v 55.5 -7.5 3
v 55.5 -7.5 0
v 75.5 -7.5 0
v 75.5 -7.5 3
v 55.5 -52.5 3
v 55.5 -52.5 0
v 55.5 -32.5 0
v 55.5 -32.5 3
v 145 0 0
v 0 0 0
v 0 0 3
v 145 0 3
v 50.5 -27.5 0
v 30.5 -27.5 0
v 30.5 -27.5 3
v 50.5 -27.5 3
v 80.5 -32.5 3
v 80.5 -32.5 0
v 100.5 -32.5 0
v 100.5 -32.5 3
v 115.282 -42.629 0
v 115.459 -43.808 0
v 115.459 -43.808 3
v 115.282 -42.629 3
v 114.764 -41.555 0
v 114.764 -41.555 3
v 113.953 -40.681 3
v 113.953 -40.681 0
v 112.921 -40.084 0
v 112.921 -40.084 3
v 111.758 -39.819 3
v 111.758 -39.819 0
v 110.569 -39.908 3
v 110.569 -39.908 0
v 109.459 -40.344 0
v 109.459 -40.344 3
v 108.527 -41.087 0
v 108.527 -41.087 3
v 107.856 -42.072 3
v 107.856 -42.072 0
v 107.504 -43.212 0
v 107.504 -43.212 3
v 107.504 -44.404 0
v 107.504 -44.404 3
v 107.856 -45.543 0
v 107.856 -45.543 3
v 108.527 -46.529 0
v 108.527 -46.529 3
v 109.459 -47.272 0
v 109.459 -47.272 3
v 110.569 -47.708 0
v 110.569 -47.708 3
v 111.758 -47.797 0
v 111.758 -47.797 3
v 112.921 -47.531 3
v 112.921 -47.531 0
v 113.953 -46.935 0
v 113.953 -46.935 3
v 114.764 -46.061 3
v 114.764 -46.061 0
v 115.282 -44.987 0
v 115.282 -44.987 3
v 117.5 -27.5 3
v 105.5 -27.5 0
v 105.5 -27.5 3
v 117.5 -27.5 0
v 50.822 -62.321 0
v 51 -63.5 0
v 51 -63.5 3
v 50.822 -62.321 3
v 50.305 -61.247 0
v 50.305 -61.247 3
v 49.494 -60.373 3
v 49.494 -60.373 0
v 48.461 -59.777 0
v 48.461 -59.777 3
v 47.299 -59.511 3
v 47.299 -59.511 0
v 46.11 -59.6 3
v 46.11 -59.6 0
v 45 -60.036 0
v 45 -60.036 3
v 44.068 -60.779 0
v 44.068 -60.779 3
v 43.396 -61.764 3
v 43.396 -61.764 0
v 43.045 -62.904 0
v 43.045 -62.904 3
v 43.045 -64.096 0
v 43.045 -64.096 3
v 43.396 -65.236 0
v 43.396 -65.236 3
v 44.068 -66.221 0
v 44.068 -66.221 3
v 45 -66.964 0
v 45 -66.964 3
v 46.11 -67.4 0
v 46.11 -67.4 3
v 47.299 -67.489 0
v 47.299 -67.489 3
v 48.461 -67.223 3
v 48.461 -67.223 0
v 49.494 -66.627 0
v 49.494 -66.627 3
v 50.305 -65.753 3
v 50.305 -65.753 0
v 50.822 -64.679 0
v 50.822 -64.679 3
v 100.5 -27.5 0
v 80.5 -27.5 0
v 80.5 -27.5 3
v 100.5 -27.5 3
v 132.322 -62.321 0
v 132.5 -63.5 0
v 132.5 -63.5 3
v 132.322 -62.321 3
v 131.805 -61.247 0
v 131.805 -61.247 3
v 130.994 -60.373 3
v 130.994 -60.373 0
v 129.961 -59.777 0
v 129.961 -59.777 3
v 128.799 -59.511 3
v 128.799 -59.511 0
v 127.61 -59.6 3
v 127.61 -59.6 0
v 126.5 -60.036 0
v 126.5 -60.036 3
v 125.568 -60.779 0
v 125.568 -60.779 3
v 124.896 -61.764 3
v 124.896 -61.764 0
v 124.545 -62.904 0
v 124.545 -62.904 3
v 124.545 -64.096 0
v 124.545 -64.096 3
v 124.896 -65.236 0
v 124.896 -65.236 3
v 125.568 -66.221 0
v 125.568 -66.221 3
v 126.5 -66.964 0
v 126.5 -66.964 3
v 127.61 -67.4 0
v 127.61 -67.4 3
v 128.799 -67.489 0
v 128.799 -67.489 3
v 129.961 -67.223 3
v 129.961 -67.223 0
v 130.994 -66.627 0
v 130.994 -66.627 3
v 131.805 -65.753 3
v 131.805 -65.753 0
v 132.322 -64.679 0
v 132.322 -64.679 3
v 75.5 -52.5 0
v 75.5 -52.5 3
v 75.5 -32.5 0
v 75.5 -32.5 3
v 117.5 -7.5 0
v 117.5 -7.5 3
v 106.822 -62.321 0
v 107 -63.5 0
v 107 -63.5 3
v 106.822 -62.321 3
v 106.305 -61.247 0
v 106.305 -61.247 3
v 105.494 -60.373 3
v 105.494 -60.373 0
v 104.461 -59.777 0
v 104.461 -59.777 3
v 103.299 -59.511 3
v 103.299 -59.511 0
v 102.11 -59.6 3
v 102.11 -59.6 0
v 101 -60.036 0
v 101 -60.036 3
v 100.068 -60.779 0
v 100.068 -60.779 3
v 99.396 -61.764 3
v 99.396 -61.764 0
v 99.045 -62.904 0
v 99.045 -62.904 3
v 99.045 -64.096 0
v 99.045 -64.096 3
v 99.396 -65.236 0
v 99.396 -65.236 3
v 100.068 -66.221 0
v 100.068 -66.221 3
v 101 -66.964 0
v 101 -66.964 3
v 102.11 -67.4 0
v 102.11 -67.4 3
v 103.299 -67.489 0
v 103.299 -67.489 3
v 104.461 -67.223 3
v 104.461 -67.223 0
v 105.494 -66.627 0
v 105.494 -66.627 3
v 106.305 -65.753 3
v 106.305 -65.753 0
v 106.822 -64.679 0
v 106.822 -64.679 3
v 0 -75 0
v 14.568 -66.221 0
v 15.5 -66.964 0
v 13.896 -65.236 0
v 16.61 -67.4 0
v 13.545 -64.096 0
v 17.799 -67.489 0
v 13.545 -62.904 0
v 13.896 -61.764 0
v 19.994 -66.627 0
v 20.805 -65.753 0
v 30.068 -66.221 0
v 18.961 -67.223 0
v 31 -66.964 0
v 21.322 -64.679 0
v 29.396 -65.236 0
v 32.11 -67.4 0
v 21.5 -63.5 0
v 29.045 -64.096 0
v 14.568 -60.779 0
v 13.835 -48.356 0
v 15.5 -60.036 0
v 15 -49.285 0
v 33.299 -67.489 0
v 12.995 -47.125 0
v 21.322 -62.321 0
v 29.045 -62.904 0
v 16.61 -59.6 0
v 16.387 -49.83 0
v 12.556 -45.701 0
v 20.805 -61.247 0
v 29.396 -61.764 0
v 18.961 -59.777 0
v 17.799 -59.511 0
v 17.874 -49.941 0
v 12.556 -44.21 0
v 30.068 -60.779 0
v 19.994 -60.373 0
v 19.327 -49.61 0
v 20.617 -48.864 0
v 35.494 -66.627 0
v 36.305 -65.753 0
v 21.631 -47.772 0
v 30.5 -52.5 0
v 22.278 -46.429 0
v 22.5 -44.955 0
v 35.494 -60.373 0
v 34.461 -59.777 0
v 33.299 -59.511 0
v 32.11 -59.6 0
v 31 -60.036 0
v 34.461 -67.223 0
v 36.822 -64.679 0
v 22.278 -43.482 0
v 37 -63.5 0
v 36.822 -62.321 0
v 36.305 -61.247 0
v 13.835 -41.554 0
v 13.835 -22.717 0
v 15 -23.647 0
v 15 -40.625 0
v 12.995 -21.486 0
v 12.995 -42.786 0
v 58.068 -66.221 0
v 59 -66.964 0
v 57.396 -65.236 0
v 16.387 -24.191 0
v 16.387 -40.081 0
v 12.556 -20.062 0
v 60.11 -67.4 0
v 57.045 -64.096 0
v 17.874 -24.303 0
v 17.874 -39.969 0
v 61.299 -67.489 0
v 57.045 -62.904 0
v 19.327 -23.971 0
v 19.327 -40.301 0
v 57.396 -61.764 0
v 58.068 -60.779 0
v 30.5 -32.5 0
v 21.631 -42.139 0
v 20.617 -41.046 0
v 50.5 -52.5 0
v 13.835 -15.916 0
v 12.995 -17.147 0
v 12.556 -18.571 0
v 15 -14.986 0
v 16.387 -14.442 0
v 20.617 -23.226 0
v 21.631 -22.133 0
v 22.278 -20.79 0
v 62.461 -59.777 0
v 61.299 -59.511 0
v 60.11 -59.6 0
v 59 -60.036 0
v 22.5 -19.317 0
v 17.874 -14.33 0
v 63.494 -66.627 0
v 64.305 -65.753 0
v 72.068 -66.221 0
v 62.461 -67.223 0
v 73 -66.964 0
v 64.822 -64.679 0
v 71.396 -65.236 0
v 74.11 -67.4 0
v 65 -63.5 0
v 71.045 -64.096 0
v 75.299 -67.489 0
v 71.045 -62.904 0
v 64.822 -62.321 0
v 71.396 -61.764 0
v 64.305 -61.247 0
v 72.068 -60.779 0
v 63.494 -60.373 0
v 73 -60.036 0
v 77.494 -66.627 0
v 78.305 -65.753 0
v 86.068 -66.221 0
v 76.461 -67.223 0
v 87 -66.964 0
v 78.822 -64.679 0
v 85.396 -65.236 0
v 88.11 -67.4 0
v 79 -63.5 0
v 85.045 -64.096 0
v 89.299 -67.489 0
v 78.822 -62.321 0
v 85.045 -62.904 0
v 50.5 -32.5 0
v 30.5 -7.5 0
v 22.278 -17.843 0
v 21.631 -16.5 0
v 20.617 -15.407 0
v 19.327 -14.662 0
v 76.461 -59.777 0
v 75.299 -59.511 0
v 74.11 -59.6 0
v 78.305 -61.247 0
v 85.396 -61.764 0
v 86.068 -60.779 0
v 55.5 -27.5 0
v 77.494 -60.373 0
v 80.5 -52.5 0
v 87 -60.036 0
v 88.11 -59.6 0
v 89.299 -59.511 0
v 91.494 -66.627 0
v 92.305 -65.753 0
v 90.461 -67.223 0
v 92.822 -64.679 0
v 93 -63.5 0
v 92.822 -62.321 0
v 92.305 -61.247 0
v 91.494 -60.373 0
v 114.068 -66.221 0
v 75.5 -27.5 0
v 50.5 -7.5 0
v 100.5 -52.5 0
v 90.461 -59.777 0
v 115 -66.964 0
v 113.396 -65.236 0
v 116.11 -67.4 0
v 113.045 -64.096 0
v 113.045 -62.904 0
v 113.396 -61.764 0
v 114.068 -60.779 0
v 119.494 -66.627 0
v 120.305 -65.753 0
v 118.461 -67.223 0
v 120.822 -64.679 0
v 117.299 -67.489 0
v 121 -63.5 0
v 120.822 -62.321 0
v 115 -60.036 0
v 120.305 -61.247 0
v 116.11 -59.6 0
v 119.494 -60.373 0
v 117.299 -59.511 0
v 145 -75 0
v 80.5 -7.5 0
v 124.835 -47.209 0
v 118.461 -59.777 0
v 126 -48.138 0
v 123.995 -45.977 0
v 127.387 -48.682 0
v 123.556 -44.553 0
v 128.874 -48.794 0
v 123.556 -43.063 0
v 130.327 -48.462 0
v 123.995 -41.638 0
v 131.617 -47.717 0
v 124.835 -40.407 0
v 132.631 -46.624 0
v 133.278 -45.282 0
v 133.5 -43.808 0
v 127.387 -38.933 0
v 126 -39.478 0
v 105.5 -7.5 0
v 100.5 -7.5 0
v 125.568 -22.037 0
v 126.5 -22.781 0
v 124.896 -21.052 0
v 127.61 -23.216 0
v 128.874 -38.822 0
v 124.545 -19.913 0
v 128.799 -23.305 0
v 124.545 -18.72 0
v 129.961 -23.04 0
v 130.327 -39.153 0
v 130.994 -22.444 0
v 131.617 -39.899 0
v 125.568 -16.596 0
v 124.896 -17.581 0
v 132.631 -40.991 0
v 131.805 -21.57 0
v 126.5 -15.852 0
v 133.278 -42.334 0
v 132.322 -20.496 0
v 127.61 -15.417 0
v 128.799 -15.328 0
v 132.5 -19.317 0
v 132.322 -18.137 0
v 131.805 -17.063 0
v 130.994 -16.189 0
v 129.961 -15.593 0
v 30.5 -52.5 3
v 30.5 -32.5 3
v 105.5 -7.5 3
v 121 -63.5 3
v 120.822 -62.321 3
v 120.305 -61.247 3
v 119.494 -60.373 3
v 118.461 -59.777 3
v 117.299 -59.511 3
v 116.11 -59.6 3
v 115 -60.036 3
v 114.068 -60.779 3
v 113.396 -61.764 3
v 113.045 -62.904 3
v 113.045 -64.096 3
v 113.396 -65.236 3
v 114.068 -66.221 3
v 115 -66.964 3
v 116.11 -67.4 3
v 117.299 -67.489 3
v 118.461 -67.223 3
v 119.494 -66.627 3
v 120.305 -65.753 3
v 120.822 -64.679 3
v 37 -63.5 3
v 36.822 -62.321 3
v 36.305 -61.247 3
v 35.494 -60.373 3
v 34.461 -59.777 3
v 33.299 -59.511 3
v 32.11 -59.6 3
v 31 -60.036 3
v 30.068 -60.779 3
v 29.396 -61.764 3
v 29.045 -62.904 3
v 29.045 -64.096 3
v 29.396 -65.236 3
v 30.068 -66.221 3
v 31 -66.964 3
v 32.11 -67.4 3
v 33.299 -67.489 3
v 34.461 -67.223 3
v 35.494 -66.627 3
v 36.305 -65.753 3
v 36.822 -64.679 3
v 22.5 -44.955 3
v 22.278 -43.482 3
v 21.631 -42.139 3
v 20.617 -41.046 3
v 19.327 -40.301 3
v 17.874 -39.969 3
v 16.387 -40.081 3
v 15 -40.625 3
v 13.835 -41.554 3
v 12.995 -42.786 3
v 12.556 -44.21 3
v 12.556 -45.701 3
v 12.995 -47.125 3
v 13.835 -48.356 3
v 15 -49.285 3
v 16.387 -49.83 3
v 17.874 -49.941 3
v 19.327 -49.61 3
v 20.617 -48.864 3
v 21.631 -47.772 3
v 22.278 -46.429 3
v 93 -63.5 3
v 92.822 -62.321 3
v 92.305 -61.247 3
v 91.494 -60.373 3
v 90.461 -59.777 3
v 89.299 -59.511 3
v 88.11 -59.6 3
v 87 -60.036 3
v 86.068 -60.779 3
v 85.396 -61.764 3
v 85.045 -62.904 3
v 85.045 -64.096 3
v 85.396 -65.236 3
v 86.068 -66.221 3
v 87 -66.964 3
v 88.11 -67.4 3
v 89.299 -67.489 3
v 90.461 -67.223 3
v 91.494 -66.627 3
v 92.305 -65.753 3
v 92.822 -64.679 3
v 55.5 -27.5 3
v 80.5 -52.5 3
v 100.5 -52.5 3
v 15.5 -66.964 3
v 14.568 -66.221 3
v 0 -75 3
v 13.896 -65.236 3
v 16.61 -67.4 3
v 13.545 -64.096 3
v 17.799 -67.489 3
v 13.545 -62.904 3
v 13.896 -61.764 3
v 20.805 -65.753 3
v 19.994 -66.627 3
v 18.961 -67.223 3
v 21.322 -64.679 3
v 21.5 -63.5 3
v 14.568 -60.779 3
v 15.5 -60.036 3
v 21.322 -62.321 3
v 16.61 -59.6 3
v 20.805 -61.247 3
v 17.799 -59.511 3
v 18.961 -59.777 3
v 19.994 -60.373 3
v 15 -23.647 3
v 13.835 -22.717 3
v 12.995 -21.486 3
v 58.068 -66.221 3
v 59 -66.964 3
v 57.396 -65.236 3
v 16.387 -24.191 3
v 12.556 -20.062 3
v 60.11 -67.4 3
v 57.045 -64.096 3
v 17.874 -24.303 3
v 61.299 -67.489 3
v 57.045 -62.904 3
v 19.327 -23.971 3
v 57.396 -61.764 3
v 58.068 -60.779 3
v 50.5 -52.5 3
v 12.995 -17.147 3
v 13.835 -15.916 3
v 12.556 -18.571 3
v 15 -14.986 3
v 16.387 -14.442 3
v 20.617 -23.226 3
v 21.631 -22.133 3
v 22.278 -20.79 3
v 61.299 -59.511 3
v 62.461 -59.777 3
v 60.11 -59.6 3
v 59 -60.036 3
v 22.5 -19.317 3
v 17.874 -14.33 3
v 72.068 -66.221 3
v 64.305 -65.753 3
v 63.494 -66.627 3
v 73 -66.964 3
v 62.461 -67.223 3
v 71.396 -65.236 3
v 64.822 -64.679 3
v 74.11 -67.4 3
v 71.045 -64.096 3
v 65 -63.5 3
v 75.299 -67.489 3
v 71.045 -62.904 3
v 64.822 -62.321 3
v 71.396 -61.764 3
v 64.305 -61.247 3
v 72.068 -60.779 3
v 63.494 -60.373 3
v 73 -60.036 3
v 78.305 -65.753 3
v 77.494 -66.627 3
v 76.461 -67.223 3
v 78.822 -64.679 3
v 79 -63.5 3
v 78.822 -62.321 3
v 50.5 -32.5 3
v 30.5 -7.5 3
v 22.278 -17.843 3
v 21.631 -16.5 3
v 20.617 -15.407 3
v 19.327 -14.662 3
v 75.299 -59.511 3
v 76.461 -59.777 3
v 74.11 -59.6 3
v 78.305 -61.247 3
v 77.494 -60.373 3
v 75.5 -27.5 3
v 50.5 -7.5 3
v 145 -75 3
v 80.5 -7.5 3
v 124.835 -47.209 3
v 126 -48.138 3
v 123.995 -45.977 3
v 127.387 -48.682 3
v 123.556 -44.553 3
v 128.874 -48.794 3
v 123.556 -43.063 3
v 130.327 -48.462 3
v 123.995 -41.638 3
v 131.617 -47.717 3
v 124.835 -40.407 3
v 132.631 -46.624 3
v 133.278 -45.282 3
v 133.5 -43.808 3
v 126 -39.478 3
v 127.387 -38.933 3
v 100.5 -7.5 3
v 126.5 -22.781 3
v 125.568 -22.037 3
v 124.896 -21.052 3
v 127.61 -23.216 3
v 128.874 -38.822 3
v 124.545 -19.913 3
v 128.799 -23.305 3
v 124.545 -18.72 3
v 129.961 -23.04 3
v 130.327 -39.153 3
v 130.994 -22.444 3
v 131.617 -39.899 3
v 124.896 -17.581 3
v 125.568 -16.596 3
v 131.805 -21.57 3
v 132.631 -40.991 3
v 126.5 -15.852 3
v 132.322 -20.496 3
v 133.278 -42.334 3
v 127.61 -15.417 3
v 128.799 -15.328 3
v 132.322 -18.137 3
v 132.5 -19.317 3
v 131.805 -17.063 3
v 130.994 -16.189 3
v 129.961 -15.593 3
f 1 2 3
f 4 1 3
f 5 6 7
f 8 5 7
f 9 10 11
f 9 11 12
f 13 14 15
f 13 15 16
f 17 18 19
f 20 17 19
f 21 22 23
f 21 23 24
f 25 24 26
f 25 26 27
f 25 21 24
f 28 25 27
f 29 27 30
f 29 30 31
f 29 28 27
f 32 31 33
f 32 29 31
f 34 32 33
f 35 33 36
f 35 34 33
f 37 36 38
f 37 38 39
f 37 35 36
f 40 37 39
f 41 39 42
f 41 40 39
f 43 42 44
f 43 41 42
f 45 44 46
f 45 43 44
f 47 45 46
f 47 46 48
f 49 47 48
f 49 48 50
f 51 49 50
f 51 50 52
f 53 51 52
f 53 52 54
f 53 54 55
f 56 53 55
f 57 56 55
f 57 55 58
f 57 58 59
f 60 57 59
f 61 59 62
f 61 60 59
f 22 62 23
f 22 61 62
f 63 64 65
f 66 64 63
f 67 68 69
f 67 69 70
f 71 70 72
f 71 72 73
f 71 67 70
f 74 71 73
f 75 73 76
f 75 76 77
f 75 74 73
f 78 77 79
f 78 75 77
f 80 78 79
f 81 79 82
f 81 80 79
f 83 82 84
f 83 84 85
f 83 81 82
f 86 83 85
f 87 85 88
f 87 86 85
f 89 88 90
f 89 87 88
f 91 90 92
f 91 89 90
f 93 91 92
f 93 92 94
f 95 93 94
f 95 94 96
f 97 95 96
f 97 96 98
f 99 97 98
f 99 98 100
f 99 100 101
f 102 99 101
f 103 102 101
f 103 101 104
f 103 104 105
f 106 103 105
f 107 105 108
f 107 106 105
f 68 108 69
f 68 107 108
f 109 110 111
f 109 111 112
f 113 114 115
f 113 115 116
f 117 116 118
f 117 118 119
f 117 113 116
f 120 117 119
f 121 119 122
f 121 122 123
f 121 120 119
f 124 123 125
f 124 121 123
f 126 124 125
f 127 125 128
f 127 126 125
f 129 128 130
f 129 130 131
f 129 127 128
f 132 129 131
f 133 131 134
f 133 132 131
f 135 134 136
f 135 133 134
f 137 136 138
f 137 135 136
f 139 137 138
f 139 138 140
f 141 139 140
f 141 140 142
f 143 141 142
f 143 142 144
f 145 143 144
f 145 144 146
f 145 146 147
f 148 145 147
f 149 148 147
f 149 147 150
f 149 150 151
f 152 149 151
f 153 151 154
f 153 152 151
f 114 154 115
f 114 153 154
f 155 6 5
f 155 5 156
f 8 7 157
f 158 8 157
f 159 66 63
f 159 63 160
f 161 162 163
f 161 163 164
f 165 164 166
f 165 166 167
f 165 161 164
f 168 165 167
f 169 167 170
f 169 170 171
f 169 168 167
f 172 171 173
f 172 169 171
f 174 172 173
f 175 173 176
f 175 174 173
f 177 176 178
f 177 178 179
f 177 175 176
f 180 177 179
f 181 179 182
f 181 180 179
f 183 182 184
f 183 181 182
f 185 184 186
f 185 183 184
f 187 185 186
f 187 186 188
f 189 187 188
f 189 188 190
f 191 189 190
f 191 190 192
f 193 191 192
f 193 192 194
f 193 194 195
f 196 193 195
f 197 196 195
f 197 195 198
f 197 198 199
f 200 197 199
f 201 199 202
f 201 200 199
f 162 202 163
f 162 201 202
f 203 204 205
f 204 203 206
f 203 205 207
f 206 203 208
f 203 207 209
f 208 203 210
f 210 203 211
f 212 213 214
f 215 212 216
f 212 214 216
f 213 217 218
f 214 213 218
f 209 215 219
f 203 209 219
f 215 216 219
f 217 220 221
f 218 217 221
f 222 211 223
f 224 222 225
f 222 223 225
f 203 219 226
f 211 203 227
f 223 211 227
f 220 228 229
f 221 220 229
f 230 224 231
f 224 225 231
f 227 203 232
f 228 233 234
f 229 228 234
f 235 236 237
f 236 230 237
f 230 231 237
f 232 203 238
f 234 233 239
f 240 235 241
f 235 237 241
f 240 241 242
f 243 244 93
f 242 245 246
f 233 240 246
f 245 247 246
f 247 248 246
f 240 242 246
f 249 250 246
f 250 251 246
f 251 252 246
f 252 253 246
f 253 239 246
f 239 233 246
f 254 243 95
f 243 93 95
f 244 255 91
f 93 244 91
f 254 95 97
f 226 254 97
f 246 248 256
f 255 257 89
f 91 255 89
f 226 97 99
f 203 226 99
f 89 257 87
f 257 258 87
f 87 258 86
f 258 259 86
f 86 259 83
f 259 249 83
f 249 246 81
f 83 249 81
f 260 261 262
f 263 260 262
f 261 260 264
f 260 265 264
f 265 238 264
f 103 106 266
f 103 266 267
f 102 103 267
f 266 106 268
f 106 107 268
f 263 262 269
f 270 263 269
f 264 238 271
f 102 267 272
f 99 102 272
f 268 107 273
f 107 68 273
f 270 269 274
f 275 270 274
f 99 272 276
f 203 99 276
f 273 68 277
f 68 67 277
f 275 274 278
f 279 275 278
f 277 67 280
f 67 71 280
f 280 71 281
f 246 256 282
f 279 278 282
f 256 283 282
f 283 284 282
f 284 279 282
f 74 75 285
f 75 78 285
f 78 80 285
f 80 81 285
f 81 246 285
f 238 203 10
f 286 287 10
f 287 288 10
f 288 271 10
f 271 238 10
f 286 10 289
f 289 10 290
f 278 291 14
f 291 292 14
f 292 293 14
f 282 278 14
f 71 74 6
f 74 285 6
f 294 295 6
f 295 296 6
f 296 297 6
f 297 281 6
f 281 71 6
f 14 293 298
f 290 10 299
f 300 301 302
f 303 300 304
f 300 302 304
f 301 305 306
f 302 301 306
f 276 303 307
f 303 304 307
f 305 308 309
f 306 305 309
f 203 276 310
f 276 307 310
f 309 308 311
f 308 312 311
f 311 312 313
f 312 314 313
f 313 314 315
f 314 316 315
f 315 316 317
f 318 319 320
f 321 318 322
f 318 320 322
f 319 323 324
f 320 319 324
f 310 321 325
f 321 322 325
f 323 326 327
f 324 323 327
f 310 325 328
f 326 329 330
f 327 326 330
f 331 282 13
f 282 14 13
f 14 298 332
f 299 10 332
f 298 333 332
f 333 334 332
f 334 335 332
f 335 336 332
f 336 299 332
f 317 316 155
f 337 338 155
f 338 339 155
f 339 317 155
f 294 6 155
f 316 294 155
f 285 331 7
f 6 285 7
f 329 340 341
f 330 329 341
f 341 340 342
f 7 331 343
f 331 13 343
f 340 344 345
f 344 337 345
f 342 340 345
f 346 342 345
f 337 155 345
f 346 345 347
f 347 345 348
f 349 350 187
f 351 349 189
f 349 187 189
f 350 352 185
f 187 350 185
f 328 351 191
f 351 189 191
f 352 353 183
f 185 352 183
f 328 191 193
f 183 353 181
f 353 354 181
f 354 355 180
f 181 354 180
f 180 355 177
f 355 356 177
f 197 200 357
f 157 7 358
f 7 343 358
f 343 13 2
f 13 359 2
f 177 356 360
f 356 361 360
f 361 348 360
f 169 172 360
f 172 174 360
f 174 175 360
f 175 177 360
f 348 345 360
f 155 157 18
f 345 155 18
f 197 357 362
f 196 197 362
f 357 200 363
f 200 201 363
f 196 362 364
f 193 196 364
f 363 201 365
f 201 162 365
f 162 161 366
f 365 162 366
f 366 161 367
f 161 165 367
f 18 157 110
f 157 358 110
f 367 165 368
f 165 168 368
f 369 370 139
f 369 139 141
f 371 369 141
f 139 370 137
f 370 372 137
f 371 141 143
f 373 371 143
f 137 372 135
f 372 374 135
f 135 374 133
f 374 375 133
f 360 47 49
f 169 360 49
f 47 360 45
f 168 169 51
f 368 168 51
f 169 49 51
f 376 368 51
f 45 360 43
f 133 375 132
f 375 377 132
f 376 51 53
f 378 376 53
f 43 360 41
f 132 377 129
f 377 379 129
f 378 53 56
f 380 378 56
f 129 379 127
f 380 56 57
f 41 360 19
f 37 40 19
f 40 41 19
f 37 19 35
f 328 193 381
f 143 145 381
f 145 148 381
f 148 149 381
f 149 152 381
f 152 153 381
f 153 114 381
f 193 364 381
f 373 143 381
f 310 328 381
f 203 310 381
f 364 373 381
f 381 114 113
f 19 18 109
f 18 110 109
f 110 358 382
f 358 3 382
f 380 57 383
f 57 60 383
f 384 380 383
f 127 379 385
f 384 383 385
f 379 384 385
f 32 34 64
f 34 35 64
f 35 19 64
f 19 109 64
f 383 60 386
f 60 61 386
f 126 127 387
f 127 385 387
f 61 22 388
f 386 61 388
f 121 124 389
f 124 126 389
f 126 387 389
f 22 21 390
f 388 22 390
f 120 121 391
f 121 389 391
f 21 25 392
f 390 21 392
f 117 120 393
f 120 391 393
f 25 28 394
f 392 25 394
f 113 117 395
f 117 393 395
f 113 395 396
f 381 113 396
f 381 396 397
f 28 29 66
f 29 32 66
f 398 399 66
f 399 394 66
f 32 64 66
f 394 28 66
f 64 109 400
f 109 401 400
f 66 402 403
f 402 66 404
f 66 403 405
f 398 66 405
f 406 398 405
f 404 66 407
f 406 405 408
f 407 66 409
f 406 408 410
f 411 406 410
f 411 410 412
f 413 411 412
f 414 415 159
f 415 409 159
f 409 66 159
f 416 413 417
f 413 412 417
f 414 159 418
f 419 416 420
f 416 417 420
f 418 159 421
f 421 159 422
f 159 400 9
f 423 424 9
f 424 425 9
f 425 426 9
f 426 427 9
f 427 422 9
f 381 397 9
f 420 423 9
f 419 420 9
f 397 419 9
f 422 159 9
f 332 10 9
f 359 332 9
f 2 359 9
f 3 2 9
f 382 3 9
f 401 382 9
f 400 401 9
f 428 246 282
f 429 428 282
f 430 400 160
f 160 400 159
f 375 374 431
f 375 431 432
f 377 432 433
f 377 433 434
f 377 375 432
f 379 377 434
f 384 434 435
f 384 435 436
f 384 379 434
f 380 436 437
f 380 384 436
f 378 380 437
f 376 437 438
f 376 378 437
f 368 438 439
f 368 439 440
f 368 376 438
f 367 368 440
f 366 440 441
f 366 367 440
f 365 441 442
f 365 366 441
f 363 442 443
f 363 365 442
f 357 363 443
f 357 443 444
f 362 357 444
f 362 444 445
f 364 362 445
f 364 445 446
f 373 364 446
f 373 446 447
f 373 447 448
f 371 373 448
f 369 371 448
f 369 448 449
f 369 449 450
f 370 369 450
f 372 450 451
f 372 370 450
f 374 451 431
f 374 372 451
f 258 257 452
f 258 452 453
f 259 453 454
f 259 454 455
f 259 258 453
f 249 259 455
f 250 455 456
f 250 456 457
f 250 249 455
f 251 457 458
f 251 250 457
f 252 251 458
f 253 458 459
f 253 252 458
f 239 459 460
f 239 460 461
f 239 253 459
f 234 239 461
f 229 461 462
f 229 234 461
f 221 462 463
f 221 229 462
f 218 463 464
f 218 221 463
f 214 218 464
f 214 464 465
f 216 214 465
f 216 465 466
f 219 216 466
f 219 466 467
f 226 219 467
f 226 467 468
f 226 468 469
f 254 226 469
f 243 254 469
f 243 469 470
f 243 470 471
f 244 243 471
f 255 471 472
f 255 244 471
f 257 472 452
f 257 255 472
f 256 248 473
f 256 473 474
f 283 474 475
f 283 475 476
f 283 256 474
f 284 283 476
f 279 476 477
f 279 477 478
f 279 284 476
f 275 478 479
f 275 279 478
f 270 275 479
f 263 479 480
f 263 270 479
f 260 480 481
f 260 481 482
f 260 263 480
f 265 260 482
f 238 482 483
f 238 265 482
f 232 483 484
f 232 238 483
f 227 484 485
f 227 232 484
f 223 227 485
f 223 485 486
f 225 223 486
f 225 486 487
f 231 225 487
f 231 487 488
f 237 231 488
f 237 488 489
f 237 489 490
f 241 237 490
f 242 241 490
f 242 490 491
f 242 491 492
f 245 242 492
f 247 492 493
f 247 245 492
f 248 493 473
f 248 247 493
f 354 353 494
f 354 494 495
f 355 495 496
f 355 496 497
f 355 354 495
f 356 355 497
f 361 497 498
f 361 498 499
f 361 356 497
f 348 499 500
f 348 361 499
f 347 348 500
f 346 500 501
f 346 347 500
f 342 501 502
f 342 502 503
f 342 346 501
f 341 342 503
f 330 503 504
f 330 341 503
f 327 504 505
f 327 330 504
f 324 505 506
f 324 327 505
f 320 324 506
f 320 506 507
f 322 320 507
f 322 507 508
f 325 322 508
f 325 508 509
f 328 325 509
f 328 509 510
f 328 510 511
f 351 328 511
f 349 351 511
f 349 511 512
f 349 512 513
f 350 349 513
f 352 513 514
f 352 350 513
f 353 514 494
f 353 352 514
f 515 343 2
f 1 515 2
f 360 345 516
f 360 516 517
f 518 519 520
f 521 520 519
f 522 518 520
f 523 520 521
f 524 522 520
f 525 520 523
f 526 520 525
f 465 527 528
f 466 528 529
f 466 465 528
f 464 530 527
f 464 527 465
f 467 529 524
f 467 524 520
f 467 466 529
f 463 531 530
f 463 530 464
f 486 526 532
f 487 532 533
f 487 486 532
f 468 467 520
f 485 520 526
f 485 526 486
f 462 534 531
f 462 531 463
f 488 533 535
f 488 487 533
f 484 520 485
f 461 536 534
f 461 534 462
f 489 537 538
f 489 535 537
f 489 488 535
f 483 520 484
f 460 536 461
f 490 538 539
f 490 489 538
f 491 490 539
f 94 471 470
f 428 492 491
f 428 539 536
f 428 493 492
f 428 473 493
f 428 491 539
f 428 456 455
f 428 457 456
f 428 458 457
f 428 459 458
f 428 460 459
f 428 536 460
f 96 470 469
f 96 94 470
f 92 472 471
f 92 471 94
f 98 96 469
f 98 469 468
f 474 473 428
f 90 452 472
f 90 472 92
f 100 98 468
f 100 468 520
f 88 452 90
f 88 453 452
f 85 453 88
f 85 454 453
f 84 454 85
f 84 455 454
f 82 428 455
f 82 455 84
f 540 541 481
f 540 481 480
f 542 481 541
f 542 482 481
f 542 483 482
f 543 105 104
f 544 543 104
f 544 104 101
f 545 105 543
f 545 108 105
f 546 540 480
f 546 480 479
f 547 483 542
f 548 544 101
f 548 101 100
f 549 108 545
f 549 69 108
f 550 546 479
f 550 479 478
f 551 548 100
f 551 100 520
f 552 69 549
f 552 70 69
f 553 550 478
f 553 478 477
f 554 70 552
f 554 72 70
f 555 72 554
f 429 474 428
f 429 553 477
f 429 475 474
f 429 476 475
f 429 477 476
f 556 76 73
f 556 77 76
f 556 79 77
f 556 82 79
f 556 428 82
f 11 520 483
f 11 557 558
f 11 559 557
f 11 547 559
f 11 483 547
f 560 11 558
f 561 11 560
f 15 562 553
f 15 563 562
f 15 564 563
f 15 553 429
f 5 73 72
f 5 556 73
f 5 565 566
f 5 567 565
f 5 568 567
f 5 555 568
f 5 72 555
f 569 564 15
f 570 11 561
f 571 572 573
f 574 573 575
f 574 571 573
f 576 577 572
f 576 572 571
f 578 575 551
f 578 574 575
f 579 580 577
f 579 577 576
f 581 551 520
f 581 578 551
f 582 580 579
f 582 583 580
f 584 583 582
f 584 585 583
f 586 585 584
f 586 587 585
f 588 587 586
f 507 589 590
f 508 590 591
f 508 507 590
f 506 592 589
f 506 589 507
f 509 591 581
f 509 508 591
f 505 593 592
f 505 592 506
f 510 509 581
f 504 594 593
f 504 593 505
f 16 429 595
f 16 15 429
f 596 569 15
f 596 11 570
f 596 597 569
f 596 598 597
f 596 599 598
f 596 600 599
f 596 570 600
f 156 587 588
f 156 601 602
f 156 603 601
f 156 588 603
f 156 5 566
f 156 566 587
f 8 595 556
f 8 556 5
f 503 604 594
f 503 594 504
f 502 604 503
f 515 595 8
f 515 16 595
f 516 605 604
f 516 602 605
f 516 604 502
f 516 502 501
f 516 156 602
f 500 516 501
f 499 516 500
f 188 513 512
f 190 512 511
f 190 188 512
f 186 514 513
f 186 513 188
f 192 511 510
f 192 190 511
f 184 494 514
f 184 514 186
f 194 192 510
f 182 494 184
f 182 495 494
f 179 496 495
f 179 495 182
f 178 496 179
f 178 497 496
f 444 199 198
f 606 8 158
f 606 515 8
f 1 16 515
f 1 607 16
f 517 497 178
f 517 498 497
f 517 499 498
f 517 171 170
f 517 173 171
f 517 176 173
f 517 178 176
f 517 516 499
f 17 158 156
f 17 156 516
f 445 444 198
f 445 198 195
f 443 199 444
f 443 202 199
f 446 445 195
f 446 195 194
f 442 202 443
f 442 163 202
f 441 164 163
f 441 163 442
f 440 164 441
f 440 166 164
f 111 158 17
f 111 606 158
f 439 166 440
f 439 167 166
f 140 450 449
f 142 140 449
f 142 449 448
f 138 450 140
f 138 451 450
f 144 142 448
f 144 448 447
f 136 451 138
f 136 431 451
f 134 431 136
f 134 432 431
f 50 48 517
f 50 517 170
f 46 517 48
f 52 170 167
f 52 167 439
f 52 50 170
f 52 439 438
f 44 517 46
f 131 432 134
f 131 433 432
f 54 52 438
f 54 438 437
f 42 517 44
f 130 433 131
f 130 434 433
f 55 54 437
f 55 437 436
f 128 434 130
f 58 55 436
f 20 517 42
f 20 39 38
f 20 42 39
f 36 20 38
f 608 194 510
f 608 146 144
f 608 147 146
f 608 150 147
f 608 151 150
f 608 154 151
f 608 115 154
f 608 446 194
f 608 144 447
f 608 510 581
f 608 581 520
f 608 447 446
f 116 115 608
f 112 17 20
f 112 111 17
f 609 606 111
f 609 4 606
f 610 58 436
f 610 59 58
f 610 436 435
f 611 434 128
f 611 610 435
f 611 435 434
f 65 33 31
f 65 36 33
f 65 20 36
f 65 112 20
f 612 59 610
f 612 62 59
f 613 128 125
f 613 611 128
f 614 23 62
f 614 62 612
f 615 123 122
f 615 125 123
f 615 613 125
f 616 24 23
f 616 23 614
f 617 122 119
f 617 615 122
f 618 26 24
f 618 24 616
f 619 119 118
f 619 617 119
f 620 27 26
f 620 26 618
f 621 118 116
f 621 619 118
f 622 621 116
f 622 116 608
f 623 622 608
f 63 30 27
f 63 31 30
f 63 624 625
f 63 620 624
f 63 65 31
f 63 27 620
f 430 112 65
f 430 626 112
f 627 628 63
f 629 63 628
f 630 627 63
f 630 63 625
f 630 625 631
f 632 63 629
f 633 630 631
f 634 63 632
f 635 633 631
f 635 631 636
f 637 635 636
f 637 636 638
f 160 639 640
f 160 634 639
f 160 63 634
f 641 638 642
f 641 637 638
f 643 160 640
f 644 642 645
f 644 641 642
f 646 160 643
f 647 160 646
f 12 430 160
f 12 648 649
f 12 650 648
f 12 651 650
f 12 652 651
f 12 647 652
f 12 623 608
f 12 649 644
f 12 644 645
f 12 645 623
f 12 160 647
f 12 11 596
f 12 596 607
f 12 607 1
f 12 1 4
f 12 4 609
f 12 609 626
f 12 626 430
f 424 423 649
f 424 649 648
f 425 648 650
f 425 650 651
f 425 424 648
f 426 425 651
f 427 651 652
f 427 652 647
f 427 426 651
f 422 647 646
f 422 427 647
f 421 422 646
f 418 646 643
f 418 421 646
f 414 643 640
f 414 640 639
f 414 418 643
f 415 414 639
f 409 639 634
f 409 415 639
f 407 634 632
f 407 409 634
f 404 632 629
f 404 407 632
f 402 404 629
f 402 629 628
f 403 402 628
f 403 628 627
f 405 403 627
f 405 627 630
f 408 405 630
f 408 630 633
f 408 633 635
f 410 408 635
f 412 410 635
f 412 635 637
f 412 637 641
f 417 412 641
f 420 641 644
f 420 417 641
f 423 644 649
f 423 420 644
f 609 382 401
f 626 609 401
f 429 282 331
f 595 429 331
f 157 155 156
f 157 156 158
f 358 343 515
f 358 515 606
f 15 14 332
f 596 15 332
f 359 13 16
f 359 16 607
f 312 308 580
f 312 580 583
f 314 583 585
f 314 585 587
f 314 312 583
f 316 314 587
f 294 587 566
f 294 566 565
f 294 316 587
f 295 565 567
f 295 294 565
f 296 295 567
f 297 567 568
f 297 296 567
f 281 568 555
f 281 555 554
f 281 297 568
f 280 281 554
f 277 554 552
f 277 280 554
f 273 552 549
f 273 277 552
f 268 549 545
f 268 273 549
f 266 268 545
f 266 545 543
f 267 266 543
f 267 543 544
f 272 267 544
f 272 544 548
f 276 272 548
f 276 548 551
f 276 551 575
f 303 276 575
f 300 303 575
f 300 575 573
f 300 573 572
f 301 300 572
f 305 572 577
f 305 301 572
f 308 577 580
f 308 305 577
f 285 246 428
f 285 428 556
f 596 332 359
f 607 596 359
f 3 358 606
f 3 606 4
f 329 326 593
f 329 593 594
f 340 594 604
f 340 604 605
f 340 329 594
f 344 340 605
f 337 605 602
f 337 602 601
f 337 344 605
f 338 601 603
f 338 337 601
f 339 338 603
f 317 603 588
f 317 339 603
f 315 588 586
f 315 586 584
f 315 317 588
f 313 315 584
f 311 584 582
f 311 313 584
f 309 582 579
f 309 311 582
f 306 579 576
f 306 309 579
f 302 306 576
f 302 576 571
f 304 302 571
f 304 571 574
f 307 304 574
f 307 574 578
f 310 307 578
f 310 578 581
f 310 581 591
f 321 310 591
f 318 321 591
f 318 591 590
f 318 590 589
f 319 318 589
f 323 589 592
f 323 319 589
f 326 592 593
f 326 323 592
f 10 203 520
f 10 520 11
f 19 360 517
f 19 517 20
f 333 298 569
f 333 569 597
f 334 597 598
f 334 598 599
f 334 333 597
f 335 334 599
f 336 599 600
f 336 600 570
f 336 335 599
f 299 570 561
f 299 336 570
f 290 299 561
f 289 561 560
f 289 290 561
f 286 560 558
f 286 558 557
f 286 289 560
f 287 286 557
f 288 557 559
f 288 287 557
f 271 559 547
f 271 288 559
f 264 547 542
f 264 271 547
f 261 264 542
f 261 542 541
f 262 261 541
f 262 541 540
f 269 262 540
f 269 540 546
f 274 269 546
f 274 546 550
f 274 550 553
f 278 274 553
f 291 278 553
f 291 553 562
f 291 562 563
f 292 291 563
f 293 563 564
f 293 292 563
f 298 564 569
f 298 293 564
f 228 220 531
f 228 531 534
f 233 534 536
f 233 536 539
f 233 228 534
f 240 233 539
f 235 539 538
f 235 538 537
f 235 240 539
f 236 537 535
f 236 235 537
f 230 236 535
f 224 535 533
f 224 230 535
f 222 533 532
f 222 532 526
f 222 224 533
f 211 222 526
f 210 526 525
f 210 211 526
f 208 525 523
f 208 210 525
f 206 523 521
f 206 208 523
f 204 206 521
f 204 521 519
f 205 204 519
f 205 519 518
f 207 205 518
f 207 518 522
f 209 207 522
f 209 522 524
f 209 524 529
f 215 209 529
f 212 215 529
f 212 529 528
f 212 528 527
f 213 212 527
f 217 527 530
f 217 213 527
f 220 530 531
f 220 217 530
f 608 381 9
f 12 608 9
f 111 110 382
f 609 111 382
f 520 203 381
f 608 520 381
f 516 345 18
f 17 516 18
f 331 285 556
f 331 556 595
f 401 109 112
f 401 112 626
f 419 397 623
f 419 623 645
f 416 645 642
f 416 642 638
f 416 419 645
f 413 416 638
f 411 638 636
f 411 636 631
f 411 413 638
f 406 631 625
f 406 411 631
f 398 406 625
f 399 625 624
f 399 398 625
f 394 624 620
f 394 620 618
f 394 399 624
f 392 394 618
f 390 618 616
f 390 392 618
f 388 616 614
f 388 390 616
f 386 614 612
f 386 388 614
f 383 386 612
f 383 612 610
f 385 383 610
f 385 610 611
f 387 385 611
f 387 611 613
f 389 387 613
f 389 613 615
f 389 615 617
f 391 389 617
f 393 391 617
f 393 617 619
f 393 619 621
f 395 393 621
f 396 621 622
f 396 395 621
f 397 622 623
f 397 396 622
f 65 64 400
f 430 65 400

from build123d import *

# Parameters (mm, degrees)
F0_W     = 145
F0_H     = 75
F0_R     = 4
F0_R_2   = 5
F0_W_2   = 20
F0_H_2   = 20
F0_W_3   = 12
F1_DEPTH = 3
F2_DEPTH = 1


with BuildPart() as f1:
    # F0 (on Top) → F1 (new body)
    with BuildSketch(Plane.XY):
        with Locations((72.5, -37.5)):
            Rectangle(F0_W, F0_H)
        with Locations((17.5, -63.5)):
            Circle(F0_R, mode=Mode.SUBTRACT)
        with Locations((33, -63.5)):
            Circle(F0_R, mode=Mode.SUBTRACT)
        with Locations((47, -63.5)):
            Circle(F0_R, mode=Mode.SUBTRACT)
        with Locations((61, -63.5)):
            Circle(F0_R, mode=Mode.SUBTRACT)
        with Locations((17.5, -44.955306)):
            Circle(F0_R_2, mode=Mode.SUBTRACT)
        with Locations((40.5, -42.5)):
            Rectangle(F0_W_2, F0_H_2, mode=Mode.SUBTRACT)
        with Locations((65.5, -42.5)):
            Rectangle(F0_W_2, F0_H_2, mode=Mode.SUBTRACT)
        with Locations((75, -63.5)):
            Circle(F0_R, mode=Mode.SUBTRACT)
        with Locations((89, -63.5)):
            Circle(F0_R, mode=Mode.SUBTRACT)
        with Locations((103, -63.5)):
            Circle(F0_R, mode=Mode.SUBTRACT)
        with Locations((117, -63.5)):
            Circle(F0_R, mode=Mode.SUBTRACT)
        with Locations((128.5, -63.5)):
            Circle(F0_R, mode=Mode.SUBTRACT)
        with Locations((90.5, -42.5)):
            Rectangle(F0_W_2, F0_H_2, mode=Mode.SUBTRACT)
        with Locations((111.459419, -43.807857)):
            Circle(F0_R, mode=Mode.SUBTRACT)
        with Locations((128.5, -43.807857)):
            Circle(F0_R_2, mode=Mode.SUBTRACT)
        with Locations((17.5, -19.316503)):
            Circle(F0_R_2, mode=Mode.SUBTRACT)
        with Locations((40.5, -17.5)):
            Rectangle(F0_W_2, F0_H_2, mode=Mode.SUBTRACT)
        with Locations((65.5, -17.5)):
            Rectangle(F0_W_2, F0_H_2, mode=Mode.SUBTRACT)
        with Locations((128.5, -19.316503)):
            Circle(F0_R, mode=Mode.SUBTRACT)
        with Locations((90.5, -17.5)):
            Rectangle(F0_W_2, F0_H_2, mode=Mode.SUBTRACT)
        with Locations((111.5, -17.5)):
            Rectangle(F0_W_3, F0_H_2, mode=Mode.SUBTRACT)
    extrude(amount=F1_DEPTH)


with BuildPart() as f2:
    # F0 (on Top) → F2 (new body)
    with BuildSketch(Plane.XY):
        with Locations((72.5, -37.5)):
            Rectangle(F0_W, F0_H)
        with Locations((17.5, -63.5)):
            Circle(F0_R, mode=Mode.SUBTRACT)
        with Locations((33, -63.5)):
            Circle(F0_R, mode=Mode.SUBTRACT)
        with Locations((47, -63.5)):
            Circle(F0_R, mode=Mode.SUBTRACT)
        with Locations((61, -63.5)):
            Circle(F0_R, mode=Mode.SUBTRACT)
        with Locations((17.5, -44.955306)):
            Circle(F0_R_2, mode=Mode.SUBTRACT)
        with Locations((40.5, -42.5)):
            Rectangle(F0_W_2, F0_H_2, mode=Mode.SUBTRACT)
        with Locations((65.5, -42.5)):
            Rectangle(F0_W_2, F0_H_2, mode=Mode.SUBTRACT)
        with Locations((75, -63.5)):
            Circle(F0_R, mode=Mode.SUBTRACT)
        with Locations((89, -63.5)):
            Circle(F0_R, mode=Mode.SUBTRACT)
        with Locations((103, -63.5)):
            Circle(F0_R, mode=Mode.SUBTRACT)
        with Locations((117, -63.5)):
            Circle(F0_R, mode=Mode.SUBTRACT)
        with Locations((128.5, -63.5)):
            Circle(F0_R, mode=Mode.SUBTRACT)
        with Locations((90.5, -42.5)):
            Rectangle(F0_W_2, F0_H_2, mode=Mode.SUBTRACT)
        with Locations((111.459419, -43.807857)):
            Circle(F0_R, mode=Mode.SUBTRACT)
        with Locations((128.5, -43.807857)):
            Circle(F0_R_2, mode=Mode.SUBTRACT)
        with Locations((17.5, -19.316503)):
            Circle(F0_R_2, mode=Mode.SUBTRACT)
        with Locations((40.5, -17.5)):
            Rectangle(F0_W_2, F0_H_2, mode=Mode.SUBTRACT)
        with Locations((65.5, -17.5)):
            Rectangle(F0_W_2, F0_H_2, mode=Mode.SUBTRACT)
        with Locations((128.5, -19.316503)):
            Circle(F0_R, mode=Mode.SUBTRACT)
        with Locations((90.5, -17.5)):
            Rectangle(F0_W_2, F0_H_2, mode=Mode.SUBTRACT)
        with Locations((111.5, -17.5)):
            Rectangle(F0_W_3, F0_H_2, mode=Mode.SUBTRACT)
    extrude(amount=-F2_DEPTH)


solid = f1.part
